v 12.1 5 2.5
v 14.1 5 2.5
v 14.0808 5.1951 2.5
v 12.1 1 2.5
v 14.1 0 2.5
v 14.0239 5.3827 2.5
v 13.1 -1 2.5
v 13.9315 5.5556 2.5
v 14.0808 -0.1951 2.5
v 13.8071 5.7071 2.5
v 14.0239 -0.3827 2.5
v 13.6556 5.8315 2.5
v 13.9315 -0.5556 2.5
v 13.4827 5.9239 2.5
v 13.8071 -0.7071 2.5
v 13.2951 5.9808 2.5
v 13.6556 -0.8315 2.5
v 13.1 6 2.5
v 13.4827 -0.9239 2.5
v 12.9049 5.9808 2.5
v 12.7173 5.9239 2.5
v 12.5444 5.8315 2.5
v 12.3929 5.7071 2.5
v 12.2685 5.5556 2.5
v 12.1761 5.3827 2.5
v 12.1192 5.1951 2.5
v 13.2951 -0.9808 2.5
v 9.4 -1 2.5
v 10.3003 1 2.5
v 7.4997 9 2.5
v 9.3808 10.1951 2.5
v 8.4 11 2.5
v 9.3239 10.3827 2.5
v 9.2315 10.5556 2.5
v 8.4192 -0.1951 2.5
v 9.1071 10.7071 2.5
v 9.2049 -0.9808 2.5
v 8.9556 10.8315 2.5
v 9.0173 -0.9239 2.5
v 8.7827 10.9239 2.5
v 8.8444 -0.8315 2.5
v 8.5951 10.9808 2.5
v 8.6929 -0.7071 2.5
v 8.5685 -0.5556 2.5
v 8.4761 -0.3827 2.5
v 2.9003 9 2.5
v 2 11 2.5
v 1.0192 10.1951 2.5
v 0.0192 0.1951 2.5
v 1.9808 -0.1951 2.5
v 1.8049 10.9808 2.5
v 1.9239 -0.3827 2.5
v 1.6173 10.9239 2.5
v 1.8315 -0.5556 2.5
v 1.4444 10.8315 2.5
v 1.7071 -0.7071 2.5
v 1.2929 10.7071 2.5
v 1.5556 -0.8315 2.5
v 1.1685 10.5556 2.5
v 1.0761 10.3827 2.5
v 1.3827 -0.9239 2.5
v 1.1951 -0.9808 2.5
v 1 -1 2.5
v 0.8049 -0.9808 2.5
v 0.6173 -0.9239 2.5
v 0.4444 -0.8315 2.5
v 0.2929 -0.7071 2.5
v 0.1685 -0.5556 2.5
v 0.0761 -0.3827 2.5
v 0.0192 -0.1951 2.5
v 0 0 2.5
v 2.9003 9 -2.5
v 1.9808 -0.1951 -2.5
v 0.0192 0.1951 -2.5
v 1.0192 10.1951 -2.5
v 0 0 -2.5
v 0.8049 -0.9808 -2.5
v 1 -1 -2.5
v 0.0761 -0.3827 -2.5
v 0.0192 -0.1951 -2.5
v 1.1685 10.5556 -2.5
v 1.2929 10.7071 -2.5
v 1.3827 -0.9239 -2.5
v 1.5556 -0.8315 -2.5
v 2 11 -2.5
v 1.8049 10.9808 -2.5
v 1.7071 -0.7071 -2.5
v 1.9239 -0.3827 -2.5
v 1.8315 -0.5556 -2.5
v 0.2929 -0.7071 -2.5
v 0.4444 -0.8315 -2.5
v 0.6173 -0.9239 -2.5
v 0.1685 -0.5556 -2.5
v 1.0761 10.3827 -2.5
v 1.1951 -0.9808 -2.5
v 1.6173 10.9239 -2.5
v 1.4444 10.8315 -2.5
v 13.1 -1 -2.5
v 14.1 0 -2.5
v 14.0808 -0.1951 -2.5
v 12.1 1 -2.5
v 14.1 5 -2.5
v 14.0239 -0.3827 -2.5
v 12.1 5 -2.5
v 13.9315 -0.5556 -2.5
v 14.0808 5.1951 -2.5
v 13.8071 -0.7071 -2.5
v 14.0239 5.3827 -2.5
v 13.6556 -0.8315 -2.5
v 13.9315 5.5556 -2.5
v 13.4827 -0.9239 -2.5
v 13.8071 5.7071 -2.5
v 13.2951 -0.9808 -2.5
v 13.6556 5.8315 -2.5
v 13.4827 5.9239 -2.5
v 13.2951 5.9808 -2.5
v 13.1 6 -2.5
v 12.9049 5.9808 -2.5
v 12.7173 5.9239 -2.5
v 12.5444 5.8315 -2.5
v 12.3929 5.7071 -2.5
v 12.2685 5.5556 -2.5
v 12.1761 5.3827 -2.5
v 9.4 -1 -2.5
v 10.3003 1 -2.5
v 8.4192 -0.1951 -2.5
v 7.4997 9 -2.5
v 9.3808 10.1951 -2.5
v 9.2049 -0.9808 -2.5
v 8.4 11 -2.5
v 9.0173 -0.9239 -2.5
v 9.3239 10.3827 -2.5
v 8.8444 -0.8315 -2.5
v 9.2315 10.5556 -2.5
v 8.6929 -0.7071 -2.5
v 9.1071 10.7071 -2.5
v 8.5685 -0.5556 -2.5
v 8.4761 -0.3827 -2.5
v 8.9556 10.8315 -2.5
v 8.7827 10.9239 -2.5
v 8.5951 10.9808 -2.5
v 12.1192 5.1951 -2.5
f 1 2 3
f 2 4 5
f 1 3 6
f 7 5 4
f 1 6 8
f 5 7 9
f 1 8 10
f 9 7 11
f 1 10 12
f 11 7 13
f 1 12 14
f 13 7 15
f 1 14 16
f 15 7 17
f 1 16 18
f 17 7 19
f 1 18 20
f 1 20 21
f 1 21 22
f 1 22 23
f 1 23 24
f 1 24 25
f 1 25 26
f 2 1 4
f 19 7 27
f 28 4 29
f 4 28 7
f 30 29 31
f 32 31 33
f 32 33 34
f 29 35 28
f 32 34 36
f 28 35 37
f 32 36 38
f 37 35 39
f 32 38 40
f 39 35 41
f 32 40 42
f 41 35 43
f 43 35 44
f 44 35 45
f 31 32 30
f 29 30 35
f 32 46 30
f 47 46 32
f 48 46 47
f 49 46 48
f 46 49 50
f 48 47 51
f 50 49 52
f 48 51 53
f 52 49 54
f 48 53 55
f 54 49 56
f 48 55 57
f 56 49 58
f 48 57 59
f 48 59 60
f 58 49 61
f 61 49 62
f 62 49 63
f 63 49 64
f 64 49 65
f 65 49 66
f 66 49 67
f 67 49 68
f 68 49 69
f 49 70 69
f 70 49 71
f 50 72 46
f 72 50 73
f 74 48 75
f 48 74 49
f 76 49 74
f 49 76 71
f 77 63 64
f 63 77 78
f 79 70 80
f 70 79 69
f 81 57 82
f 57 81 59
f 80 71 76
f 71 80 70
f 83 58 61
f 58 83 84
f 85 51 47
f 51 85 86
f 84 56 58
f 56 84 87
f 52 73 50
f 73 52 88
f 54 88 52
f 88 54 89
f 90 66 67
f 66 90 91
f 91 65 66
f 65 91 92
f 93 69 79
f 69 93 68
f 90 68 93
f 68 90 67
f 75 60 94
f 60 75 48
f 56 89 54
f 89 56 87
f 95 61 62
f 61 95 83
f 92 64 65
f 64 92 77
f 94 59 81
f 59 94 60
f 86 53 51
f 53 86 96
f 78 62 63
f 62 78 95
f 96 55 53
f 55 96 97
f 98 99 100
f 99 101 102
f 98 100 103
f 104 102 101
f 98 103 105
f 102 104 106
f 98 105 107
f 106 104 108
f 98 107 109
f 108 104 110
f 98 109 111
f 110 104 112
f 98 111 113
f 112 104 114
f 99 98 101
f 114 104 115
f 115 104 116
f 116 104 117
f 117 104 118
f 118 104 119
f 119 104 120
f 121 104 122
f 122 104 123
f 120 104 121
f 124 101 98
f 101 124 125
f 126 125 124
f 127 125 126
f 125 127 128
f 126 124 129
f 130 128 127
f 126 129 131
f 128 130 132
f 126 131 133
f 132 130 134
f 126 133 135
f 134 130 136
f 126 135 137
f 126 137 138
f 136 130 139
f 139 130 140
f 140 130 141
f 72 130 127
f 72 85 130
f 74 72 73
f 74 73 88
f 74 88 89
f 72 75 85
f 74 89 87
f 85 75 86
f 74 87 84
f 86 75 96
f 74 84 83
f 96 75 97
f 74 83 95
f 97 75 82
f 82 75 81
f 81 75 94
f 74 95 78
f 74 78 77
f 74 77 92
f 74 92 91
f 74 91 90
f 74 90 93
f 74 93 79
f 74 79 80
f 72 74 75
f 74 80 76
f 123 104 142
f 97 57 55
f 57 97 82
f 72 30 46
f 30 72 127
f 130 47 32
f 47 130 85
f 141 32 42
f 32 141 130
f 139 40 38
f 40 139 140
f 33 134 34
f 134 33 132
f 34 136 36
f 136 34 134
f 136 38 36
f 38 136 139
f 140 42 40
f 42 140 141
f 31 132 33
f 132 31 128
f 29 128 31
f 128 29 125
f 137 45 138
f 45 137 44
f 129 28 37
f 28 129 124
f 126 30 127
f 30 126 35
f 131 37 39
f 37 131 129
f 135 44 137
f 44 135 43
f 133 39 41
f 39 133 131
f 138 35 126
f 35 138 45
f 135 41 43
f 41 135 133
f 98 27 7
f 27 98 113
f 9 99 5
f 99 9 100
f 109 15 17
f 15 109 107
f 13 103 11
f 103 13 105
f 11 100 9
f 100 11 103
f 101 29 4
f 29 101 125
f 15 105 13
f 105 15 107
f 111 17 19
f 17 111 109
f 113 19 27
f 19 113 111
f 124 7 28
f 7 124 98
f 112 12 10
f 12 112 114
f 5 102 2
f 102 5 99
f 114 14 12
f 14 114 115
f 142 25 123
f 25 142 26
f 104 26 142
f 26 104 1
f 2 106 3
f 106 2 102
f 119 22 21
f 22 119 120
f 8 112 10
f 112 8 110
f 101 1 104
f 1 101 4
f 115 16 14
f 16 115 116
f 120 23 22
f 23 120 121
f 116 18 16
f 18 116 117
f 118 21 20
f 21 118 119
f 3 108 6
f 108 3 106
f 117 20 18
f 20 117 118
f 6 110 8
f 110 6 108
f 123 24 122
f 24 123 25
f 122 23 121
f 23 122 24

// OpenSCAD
H=5;
B=10;//12.2 real;
A=11.3-1.9; // real depth

Q=1;
A0=A-Q;
A1=A+Q;

C=1.7; // wall width

W=2;

D_A=(A1-A0)/2;

module p() {
    cylinder($fn=32,h=H,d=W,center=true);
}

module hullLine() {
    for(o = [0:$children-2])  {
        hull() {
            children(o+0);
            children(o+1);
        }
    }
}

hullLine() {
    R=[W/2,0,0];
    L=-R;
    
    translate(R)
        translate([0,0,0])  p();
    translate(R)
        translate([D_A+0,B,0])  p();
    translate(L)
        translate([D_A+A0,B,0])  p();
    translate(L)
        translate([A1,0,0])  p();
    translate(R)
        translate([A1+C,0,0])  p();
    translate(R)
        translate([A1+C,B/2,0])  p();
}
